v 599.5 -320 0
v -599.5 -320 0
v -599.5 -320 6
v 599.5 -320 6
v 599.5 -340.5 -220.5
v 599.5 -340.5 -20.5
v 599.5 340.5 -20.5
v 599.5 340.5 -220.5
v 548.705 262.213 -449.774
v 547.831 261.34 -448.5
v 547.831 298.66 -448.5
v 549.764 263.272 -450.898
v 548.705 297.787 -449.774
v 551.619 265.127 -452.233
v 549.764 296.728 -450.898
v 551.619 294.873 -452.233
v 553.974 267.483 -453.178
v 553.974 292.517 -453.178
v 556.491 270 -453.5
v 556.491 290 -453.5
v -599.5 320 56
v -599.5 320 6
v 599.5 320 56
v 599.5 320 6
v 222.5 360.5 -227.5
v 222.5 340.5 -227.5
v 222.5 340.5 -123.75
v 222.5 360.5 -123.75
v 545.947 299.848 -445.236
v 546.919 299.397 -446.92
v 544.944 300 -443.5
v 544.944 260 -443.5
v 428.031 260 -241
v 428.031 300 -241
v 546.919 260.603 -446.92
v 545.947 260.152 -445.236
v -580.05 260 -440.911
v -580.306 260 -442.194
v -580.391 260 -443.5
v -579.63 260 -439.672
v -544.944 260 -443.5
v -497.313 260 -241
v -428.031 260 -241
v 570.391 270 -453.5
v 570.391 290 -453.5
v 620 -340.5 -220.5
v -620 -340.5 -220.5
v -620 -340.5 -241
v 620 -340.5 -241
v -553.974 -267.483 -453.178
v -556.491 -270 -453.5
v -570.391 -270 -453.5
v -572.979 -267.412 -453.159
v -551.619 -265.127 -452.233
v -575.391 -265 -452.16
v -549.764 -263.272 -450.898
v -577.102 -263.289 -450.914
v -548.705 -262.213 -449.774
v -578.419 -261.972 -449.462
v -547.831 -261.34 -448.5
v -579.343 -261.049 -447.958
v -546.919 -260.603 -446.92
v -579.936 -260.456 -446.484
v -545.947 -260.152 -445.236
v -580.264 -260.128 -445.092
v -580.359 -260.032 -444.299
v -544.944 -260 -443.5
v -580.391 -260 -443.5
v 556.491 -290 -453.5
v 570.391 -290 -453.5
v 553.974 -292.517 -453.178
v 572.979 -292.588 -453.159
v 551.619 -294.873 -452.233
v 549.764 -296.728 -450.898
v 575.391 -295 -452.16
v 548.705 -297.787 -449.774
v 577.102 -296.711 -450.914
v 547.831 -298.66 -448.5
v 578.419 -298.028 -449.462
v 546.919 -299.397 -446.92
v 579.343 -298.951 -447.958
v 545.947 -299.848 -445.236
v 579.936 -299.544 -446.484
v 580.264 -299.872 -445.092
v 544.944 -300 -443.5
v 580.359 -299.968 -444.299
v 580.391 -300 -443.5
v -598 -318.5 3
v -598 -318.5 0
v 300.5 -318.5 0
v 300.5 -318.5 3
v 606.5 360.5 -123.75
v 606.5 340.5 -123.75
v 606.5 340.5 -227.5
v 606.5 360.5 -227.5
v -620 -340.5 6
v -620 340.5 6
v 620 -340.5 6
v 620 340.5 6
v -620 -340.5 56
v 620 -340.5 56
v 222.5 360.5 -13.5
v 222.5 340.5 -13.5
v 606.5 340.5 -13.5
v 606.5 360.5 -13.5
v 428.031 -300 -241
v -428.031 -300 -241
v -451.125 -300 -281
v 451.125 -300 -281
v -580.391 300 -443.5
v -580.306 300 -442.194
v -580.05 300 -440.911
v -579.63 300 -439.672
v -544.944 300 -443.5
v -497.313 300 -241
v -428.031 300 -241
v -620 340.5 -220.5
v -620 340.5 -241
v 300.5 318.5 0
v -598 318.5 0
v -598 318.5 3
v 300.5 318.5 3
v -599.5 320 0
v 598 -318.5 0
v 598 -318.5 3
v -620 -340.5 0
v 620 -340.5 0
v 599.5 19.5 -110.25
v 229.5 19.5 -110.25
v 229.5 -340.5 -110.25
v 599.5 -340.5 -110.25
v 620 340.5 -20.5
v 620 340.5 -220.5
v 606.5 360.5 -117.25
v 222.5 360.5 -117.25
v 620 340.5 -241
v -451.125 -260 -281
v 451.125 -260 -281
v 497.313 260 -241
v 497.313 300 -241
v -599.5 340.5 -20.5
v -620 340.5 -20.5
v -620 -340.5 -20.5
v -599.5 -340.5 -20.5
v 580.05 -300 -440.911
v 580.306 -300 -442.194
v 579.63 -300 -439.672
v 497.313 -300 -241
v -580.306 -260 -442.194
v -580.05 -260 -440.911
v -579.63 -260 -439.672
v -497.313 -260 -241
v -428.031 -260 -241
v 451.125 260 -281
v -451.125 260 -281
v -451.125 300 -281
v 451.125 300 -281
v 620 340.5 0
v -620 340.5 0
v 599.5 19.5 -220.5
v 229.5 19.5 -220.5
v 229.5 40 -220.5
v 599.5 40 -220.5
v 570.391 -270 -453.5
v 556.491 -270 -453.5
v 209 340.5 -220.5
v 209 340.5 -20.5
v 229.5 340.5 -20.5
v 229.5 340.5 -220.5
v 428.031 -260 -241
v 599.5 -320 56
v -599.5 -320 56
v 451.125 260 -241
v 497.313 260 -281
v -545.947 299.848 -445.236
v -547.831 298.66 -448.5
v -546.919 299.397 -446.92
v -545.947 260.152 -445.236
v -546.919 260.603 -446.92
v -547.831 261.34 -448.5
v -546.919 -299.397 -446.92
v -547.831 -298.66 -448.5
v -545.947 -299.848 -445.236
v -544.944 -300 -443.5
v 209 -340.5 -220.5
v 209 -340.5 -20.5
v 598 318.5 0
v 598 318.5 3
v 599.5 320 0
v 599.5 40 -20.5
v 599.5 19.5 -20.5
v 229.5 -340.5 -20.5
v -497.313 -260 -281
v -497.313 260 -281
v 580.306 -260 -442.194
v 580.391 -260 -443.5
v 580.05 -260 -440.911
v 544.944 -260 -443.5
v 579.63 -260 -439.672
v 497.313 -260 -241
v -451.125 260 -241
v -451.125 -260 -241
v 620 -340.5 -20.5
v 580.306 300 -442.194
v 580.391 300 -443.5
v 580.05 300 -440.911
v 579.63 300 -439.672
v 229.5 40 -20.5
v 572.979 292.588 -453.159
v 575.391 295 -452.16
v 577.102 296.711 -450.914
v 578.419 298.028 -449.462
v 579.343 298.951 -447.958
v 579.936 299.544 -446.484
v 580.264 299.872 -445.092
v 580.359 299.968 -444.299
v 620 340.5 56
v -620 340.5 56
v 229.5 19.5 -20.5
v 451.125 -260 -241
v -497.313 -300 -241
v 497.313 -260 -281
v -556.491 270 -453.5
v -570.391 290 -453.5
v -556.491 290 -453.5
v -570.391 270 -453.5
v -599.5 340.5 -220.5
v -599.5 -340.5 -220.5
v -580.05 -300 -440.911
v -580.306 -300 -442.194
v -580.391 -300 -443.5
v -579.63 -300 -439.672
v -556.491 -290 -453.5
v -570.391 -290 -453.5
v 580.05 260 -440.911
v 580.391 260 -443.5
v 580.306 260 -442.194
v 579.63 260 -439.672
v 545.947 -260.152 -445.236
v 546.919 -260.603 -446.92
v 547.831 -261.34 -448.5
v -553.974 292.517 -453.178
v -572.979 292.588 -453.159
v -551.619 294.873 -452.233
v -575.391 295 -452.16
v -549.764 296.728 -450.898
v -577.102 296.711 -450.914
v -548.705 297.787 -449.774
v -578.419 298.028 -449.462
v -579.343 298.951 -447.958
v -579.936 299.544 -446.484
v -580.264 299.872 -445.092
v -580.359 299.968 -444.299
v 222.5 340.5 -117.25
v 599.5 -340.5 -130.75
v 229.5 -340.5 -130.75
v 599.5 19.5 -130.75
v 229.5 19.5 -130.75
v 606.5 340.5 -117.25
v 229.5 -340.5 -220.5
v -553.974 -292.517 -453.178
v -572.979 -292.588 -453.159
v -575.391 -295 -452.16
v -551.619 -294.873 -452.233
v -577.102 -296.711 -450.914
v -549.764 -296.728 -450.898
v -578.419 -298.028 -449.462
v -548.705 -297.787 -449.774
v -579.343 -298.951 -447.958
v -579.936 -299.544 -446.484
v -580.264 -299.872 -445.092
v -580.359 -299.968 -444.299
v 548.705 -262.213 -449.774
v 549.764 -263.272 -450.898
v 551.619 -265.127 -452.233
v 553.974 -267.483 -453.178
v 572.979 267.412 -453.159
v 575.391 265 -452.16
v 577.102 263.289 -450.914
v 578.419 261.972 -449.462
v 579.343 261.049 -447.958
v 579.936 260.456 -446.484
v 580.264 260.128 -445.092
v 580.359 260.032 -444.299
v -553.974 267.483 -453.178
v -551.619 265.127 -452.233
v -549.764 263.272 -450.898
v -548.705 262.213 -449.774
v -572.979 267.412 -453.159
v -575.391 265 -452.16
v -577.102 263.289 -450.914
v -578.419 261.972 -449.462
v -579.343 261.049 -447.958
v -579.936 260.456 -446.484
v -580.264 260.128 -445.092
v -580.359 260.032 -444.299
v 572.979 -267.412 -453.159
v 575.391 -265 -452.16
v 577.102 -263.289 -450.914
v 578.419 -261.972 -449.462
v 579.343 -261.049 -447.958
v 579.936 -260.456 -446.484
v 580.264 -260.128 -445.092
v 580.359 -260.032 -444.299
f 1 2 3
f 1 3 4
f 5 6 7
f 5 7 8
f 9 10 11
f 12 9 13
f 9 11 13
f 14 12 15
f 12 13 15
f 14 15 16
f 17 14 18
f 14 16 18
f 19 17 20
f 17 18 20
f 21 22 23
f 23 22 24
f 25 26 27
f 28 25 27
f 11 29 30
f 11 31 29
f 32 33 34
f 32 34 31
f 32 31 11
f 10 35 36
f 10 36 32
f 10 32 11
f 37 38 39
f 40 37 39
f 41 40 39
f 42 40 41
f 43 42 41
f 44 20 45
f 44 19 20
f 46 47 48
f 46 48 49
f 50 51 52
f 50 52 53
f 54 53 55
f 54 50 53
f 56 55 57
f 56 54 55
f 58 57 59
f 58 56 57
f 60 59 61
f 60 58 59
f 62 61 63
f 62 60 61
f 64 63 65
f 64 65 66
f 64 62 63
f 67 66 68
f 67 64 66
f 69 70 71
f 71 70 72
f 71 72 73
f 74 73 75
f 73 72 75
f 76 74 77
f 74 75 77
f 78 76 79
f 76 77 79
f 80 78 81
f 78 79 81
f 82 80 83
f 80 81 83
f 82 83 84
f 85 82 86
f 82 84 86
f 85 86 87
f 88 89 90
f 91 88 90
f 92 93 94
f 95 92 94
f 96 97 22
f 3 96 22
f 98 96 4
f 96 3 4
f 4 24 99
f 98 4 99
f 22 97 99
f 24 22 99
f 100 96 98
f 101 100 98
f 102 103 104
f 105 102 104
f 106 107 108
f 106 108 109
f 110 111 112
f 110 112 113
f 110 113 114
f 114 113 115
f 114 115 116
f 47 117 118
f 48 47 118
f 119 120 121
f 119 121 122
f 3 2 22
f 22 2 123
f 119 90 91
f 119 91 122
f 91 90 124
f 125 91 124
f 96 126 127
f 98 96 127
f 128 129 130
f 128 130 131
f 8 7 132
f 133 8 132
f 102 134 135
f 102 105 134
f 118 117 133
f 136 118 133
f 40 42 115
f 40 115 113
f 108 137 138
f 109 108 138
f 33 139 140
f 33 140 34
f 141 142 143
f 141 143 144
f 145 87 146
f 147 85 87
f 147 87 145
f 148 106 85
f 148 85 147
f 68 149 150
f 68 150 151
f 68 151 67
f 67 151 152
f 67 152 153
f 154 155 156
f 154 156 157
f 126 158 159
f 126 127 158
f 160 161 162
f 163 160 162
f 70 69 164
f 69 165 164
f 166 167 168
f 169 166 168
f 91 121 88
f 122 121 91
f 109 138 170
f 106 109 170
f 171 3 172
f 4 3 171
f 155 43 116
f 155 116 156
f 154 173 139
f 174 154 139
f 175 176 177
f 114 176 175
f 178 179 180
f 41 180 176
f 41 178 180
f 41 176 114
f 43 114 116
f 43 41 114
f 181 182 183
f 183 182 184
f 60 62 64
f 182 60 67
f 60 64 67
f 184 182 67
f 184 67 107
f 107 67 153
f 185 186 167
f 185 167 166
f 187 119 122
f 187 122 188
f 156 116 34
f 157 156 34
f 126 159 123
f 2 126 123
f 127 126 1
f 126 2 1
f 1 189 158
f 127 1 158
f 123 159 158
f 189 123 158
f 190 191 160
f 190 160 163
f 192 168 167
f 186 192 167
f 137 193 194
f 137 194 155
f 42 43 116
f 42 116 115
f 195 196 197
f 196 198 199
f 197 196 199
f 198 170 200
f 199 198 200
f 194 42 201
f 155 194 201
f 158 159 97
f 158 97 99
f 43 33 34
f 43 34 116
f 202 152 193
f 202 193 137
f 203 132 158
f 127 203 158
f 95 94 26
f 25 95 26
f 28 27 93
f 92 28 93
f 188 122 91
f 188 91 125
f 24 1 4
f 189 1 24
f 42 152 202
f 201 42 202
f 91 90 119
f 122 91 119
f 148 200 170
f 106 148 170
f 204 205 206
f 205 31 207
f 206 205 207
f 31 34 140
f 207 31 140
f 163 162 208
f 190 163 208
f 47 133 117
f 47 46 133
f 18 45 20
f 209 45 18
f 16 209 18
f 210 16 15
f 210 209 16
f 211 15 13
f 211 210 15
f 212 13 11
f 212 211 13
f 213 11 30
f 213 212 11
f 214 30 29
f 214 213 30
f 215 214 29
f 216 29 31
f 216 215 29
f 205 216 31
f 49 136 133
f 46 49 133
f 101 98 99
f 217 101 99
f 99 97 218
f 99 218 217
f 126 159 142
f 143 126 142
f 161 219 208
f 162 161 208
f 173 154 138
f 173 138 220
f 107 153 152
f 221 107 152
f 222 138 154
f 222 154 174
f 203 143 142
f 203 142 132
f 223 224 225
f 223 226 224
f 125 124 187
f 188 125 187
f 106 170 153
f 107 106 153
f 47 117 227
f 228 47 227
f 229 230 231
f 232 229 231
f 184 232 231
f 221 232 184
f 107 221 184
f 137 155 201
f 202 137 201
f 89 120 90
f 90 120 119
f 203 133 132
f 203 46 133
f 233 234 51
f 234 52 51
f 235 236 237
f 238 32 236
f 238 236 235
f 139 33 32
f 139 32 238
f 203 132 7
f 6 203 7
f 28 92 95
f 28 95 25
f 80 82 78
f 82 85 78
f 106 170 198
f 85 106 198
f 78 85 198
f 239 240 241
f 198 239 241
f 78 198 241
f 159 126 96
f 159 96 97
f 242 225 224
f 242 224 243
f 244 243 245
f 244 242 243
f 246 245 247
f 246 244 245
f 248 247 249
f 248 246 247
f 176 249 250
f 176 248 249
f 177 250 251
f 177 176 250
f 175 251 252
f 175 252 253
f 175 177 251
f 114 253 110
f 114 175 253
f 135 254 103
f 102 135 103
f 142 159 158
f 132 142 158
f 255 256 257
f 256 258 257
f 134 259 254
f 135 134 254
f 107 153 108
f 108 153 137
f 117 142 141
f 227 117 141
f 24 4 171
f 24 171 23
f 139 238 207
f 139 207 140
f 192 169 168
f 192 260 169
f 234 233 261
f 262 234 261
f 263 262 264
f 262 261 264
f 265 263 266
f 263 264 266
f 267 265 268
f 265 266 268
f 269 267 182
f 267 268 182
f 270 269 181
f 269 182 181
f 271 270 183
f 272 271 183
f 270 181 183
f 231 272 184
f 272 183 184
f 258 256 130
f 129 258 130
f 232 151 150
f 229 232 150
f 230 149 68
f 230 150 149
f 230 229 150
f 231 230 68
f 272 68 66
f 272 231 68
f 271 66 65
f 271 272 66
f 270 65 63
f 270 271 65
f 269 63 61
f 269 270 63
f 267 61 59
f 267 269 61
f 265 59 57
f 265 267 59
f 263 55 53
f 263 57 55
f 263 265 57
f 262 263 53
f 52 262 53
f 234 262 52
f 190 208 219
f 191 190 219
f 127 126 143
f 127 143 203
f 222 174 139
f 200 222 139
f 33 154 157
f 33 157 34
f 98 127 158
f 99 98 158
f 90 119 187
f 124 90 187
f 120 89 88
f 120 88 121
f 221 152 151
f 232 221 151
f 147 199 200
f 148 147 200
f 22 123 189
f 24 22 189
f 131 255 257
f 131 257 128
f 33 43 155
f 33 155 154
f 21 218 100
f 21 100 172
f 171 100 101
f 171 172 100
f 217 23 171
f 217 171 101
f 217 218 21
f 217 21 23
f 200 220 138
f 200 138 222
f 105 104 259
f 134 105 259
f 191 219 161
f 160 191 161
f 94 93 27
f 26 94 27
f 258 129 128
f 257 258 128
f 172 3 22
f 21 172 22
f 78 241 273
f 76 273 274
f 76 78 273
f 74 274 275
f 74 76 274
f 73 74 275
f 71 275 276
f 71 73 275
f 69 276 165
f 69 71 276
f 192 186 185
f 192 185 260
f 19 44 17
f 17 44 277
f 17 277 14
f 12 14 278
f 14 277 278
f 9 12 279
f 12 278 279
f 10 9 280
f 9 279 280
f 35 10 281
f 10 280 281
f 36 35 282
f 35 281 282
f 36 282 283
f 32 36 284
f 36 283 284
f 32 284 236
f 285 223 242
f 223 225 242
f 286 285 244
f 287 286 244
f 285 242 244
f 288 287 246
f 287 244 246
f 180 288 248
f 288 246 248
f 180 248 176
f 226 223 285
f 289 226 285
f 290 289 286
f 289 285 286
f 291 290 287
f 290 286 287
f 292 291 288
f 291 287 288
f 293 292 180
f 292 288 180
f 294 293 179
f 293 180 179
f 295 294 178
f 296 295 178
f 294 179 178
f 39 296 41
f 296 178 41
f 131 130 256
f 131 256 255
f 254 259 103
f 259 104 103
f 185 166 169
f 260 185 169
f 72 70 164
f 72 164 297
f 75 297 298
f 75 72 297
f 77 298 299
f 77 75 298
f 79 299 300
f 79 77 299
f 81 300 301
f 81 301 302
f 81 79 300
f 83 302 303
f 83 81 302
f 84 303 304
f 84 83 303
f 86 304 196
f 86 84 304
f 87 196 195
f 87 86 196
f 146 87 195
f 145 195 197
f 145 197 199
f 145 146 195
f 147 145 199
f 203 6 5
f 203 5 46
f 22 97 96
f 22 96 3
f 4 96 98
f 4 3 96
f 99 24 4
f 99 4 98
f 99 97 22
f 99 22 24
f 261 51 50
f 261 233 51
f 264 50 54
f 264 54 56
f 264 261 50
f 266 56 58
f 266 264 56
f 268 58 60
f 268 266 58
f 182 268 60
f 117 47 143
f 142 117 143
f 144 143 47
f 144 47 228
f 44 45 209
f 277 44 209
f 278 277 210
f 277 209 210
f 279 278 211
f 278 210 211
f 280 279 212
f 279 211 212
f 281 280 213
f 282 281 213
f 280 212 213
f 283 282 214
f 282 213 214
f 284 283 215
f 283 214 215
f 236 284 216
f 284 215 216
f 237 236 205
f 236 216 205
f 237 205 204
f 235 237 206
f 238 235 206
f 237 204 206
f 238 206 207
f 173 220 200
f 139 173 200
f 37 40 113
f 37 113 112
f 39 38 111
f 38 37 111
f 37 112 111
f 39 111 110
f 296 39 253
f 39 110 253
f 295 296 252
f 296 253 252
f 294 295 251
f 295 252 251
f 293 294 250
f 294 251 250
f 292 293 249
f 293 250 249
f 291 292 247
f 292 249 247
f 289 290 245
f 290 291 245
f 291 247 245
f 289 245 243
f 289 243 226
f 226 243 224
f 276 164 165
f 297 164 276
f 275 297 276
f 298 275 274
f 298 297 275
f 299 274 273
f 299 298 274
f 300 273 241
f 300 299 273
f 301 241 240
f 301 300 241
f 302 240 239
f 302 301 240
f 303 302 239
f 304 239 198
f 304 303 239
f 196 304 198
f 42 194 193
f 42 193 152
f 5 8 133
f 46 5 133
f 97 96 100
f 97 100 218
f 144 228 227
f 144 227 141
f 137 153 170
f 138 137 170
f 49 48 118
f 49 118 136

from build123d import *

# Parameters (mm, degrees)
F1_DEPTH       = 340.5
F1_DEPTH_BACK  = 340.5
F2_DEPTH       = 340.5
F2_DEPTH_BACK  = 340.5
F0_W           = 20.5
F0_H           = 200
F3_DEPTH       = 340.5
F3_DEPTH_BACK  = 340.5
F6_DEPTH       = 40
F7_R           = 10
F7_2_R         = 10
F8_DEPTH       = 40
F10_W          = 46.1880215352
F10_H          = 40
F11_DEPTH      = 520
F12_W          = 7
F12_H          = 96.75
F13_DEPTH      = 20
F14_W          = 1240
F14_H          = 681
F14_W_2        = 1230
F14_H_2        = 671
F14_W_3        = 1199
F14_H_3        = 640
F15_DEPTH      = 6
F16_W          = 898.5
F16_H          = 637
F17_DEPTH      = 3
F16_W_2        = 297.5
F18_DEPTH      = 3
F19_DEPTH      = 50
F22_DEPTH      = 370
F0_W_2         = 370
F0_H_2         = 20.5
F23_DEPTH      = 19.5
F23_DEPTH_BACK = 340.5


# Not quite as in the source:
# - a feature names something its author has since deleted; it is built from what else it names


with BuildPart() as f1:
    # F0 (on Front) → F1 (new body, two sides)
    with BuildSketch(Plane.XZ) as f1_sk:
        Polygon((-599.5, -220.5), (-620, -220.5), (-620, -241), (620, -241), (620, -220.5), (599.5, -220.5), (229.5, -220.5), (209, -220.5), align=None)
    extrude(amount=F1_DEPTH)
    extrude(f1_sk.sketch, amount=-F1_DEPTH_BACK)


with BuildPart() as f2:
    # F0 (on Front) → F2 (new body, two sides)
    with BuildSketch(Plane.XZ) as f2_sk:
        Polygon((229.5, -20.5), (209, -20.5), (209, -220.5), (229.5, -220.5), (229.5, -130.75), (229.5, -110.25), align=None)
    extrude(amount=F2_DEPTH)
    extrude(f2_sk.sketch, amount=-F2_DEPTH_BACK)


with BuildPart() as f2b:
    # F0 (on Front) → F2, piece 2 (new body, two sides)
    with BuildSketch(Plane.XZ) as f2_2_sk:
        with Locations((-609.75, -120.5)):
            Rectangle(F0_W, F0_H)
    extrude(amount=F2_DEPTH)
    extrude(f2_2_sk.sketch, amount=-F2_DEPTH_BACK)


with BuildPart() as f2c:
    # F0 (on Front) → F2, piece 3 (new body, two sides)
    with BuildSketch(Plane.XZ) as f2_3_sk:
        Polygon((620, -220.5), (620, -20.5), (599.5, -20.5), (599.5, -110.25), (599.5, -130.75), (599.5, -220.5), align=None)
    extrude(amount=F2_DEPTH)
    extrude(f2_3_sk.sketch, amount=-F2_DEPTH_BACK)


with BuildPart() as f3:
    # F0 (on Front) → F3 (new body, two sides)
    with BuildSketch(Plane.XZ) as f3_sk:
        Polygon((620, 0), (-620, 0), (-620, -20.5), (-599.5, -20.5), (209, -20.5), (229.5, -20.5), (599.5, -20.5), (620, -20.5), align=None)
    extrude(amount=F3_DEPTH)
    extrude(f3_sk.sketch, amount=-F3_DEPTH_BACK)


with BuildPart() as f6:
    # F5 (on offset) → F6 (new body)
    with BuildSketch(Plane.XZ.offset(260)):
        Polygon((-428.0310354944, -241), (-497.3130677972, -241), (-585.3589838486, -453.5), (-550.7179676972, -453.5), (-451.125046262, -281), align=None)
    extrude(amount=F6_DEPTH)

    # F7
    f7_edges = [f6.edges().sort_by_distance(p)[0] for p in [
        (-568.038476, -300, -453.5),
        (-550.717968, -280, -453.5),
        (-568.038476, -260, -453.5),
        (-585.358984, -280, -453.5),
    ]]
    fillet(f7_edges, radius=F7_R)


with BuildPart() as f6b:
    # F5 (on offset) → F6, piece 2 (new body)
    with BuildSketch(Plane.XZ.offset(260)):
        Polygon((497.3130677972, -241), (428.0310354944, -241), (451.125046262, -281), (550.7179676972, -453.5), (585.3589838486, -453.5), align=None)
    extrude(amount=F6_DEPTH)

    # F7#2
    f7_2_edges = [f6b.edges().sort_by_distance(p)[0] for p in [
        (568.038476, -300, -453.5),
        (550.717968, -280, -453.5),
        (568.038476, -260, -453.5),
        (585.358984, -280, -453.5),
    ]]
    fillet(f7_2_edges, radius=F7_2_R)


with BuildPart() as f8:
    # F5 (on offset) → F8 (new body)
    with BuildSketch(Plane.XZ.offset(260)):
        Polygon((428.0310354944, -241), (-428.0310354944, -241), (-451.125046262, -281), (451.125046262, -281), align=None)
    extrude(amount=F8_DEPTH)


with BuildPart() as f9_1:
    # F9: instance of F6
    add(f6.part.mirror(Plane.XZ))


with BuildPart() as f9_2:
    # F9: instance of F6b
    add(f6b.part.mirror(Plane.XZ))


with BuildPart() as f9_3:
    # F9: instance of F8
    add(f8.part.mirror(Plane.XZ))


with BuildPart() as f11:
    # F10 (on face) → F11 (new body, through all)
    with BuildSketch(Plane.XZ.offset(260)):
        with Locations((474.2190570296, -261)):
            Rectangle(F10_W, F10_H)
    extrude(amount=-F11_DEPTH)


with BuildPart() as f11b:
    # F10 (on face) → F11, piece 2 (new body, through all)
    with BuildSketch(Plane.XZ.offset(260)):
        with Locations((-474.2190570296, -261)):
            Rectangle(F10_W, F10_H)
    extrude(amount=-F11_DEPTH)


with BuildPart() as f13:
    # F12 (on face) → F13 (new body)
    with BuildSketch(Plane(origin=(0, 340.5, 0), x_dir=(-1, 0, 0), z_dir=(0, 1, 0))):
        with Locations((-603, -68.875)):
            Rectangle(F12_W, F12_H)
        Polygon((-222.5, -117.25), (-222.5, -13.5), (-606.5, -13.5), (-606.5, -20.5), (-599.5, -20.5), (-599.5, -117.25), align=None)
    extrude(amount=F13_DEPTH)


with BuildPart() as f13b:
    # F12 (on face) → F13, piece 2 (new body)
    with BuildSketch(Plane(origin=(0, 340.5, 0), x_dir=(-1, 0, 0), z_dir=(0, 1, 0))):
        with Locations((-603, -172.125)):
            Rectangle(F12_W, F12_H)
        Polygon((-222.5, -123.75), (-599.5, -123.75), (-599.5, -220.5), (-606.5, -220.5), (-606.5, -227.5), (-222.5, -227.5), align=None)
    extrude(amount=F13_DEPTH)


with BuildPart() as f15:
    # F14 (on face) → F15 (new body)
    with BuildSketch(Plane.XY):
        Rectangle(F14_W, F14_H)
        Rectangle(F14_W_2, F14_H_2, mode=Mode.SUBTRACT)
        Rectangle(F14_W_2, F14_H_2)
        Rectangle(F14_W_3, F14_H_3, mode=Mode.SUBTRACT)
    extrude(amount=F15_DEPTH)


with BuildPart() as f17:
    # F16 (on face) → F17 (new body)
    with BuildSketch(Plane.XY):
        with Locations((-148.75, 0)):
            Rectangle(F16_W, F16_H)
    extrude(amount=F17_DEPTH)


with BuildPart() as f18:
    # F16 (on face) → F18 (new body, through all)
    with BuildSketch(Plane.XY):
        with Locations((449.25, 0)):
            Rectangle(F16_W_2, F16_H)
    extrude(amount=F18_DEPTH)


with BuildPart() as f19:
    # F19 (new): a face of the model
    f19_faces = [f15.part.faces().sort_by_distance(p)[0] for p in [
        (-613.646946667, 0, 6),
    ]]
    extrude(f19_faces, amount=F19_DEPTH)


with BuildPart() as f22:
    # F21 (on face) → F22 (new body, through all)
    with BuildSketch(Plane.YZ.offset(229.5)):
        Polygon((40, -20.5), (19.5, -20.5), (19.5, -130.75), (19.5, -220.5), (40, -220.5), (40, -130.75), align=None)
    extrude(amount=F22_DEPTH)


with BuildPart() as f23:
    # F0 (on Front) → F23 (new body, two sides)
    with BuildSketch(Plane.XZ) as f23_sk:
        with Locations((414.5, -120.5)):
            Rectangle(F0_W_2, F0_H_2)
    extrude(amount=-F23_DEPTH)
    extrude(f23_sk.sketch, amount=F23_DEPTH_BACK)


solid = Compound([f1.part, f2.part, f2b.part, f2c.part, f3.part, f6.part, f6b.part, f8.part, f9_1.part, f9_2.part, f9_3.part, f11.part, f11b.part, f13.part, f13b.part, f15.part, f17.part, f18.part, f19.part, f22.part, f23.part])
